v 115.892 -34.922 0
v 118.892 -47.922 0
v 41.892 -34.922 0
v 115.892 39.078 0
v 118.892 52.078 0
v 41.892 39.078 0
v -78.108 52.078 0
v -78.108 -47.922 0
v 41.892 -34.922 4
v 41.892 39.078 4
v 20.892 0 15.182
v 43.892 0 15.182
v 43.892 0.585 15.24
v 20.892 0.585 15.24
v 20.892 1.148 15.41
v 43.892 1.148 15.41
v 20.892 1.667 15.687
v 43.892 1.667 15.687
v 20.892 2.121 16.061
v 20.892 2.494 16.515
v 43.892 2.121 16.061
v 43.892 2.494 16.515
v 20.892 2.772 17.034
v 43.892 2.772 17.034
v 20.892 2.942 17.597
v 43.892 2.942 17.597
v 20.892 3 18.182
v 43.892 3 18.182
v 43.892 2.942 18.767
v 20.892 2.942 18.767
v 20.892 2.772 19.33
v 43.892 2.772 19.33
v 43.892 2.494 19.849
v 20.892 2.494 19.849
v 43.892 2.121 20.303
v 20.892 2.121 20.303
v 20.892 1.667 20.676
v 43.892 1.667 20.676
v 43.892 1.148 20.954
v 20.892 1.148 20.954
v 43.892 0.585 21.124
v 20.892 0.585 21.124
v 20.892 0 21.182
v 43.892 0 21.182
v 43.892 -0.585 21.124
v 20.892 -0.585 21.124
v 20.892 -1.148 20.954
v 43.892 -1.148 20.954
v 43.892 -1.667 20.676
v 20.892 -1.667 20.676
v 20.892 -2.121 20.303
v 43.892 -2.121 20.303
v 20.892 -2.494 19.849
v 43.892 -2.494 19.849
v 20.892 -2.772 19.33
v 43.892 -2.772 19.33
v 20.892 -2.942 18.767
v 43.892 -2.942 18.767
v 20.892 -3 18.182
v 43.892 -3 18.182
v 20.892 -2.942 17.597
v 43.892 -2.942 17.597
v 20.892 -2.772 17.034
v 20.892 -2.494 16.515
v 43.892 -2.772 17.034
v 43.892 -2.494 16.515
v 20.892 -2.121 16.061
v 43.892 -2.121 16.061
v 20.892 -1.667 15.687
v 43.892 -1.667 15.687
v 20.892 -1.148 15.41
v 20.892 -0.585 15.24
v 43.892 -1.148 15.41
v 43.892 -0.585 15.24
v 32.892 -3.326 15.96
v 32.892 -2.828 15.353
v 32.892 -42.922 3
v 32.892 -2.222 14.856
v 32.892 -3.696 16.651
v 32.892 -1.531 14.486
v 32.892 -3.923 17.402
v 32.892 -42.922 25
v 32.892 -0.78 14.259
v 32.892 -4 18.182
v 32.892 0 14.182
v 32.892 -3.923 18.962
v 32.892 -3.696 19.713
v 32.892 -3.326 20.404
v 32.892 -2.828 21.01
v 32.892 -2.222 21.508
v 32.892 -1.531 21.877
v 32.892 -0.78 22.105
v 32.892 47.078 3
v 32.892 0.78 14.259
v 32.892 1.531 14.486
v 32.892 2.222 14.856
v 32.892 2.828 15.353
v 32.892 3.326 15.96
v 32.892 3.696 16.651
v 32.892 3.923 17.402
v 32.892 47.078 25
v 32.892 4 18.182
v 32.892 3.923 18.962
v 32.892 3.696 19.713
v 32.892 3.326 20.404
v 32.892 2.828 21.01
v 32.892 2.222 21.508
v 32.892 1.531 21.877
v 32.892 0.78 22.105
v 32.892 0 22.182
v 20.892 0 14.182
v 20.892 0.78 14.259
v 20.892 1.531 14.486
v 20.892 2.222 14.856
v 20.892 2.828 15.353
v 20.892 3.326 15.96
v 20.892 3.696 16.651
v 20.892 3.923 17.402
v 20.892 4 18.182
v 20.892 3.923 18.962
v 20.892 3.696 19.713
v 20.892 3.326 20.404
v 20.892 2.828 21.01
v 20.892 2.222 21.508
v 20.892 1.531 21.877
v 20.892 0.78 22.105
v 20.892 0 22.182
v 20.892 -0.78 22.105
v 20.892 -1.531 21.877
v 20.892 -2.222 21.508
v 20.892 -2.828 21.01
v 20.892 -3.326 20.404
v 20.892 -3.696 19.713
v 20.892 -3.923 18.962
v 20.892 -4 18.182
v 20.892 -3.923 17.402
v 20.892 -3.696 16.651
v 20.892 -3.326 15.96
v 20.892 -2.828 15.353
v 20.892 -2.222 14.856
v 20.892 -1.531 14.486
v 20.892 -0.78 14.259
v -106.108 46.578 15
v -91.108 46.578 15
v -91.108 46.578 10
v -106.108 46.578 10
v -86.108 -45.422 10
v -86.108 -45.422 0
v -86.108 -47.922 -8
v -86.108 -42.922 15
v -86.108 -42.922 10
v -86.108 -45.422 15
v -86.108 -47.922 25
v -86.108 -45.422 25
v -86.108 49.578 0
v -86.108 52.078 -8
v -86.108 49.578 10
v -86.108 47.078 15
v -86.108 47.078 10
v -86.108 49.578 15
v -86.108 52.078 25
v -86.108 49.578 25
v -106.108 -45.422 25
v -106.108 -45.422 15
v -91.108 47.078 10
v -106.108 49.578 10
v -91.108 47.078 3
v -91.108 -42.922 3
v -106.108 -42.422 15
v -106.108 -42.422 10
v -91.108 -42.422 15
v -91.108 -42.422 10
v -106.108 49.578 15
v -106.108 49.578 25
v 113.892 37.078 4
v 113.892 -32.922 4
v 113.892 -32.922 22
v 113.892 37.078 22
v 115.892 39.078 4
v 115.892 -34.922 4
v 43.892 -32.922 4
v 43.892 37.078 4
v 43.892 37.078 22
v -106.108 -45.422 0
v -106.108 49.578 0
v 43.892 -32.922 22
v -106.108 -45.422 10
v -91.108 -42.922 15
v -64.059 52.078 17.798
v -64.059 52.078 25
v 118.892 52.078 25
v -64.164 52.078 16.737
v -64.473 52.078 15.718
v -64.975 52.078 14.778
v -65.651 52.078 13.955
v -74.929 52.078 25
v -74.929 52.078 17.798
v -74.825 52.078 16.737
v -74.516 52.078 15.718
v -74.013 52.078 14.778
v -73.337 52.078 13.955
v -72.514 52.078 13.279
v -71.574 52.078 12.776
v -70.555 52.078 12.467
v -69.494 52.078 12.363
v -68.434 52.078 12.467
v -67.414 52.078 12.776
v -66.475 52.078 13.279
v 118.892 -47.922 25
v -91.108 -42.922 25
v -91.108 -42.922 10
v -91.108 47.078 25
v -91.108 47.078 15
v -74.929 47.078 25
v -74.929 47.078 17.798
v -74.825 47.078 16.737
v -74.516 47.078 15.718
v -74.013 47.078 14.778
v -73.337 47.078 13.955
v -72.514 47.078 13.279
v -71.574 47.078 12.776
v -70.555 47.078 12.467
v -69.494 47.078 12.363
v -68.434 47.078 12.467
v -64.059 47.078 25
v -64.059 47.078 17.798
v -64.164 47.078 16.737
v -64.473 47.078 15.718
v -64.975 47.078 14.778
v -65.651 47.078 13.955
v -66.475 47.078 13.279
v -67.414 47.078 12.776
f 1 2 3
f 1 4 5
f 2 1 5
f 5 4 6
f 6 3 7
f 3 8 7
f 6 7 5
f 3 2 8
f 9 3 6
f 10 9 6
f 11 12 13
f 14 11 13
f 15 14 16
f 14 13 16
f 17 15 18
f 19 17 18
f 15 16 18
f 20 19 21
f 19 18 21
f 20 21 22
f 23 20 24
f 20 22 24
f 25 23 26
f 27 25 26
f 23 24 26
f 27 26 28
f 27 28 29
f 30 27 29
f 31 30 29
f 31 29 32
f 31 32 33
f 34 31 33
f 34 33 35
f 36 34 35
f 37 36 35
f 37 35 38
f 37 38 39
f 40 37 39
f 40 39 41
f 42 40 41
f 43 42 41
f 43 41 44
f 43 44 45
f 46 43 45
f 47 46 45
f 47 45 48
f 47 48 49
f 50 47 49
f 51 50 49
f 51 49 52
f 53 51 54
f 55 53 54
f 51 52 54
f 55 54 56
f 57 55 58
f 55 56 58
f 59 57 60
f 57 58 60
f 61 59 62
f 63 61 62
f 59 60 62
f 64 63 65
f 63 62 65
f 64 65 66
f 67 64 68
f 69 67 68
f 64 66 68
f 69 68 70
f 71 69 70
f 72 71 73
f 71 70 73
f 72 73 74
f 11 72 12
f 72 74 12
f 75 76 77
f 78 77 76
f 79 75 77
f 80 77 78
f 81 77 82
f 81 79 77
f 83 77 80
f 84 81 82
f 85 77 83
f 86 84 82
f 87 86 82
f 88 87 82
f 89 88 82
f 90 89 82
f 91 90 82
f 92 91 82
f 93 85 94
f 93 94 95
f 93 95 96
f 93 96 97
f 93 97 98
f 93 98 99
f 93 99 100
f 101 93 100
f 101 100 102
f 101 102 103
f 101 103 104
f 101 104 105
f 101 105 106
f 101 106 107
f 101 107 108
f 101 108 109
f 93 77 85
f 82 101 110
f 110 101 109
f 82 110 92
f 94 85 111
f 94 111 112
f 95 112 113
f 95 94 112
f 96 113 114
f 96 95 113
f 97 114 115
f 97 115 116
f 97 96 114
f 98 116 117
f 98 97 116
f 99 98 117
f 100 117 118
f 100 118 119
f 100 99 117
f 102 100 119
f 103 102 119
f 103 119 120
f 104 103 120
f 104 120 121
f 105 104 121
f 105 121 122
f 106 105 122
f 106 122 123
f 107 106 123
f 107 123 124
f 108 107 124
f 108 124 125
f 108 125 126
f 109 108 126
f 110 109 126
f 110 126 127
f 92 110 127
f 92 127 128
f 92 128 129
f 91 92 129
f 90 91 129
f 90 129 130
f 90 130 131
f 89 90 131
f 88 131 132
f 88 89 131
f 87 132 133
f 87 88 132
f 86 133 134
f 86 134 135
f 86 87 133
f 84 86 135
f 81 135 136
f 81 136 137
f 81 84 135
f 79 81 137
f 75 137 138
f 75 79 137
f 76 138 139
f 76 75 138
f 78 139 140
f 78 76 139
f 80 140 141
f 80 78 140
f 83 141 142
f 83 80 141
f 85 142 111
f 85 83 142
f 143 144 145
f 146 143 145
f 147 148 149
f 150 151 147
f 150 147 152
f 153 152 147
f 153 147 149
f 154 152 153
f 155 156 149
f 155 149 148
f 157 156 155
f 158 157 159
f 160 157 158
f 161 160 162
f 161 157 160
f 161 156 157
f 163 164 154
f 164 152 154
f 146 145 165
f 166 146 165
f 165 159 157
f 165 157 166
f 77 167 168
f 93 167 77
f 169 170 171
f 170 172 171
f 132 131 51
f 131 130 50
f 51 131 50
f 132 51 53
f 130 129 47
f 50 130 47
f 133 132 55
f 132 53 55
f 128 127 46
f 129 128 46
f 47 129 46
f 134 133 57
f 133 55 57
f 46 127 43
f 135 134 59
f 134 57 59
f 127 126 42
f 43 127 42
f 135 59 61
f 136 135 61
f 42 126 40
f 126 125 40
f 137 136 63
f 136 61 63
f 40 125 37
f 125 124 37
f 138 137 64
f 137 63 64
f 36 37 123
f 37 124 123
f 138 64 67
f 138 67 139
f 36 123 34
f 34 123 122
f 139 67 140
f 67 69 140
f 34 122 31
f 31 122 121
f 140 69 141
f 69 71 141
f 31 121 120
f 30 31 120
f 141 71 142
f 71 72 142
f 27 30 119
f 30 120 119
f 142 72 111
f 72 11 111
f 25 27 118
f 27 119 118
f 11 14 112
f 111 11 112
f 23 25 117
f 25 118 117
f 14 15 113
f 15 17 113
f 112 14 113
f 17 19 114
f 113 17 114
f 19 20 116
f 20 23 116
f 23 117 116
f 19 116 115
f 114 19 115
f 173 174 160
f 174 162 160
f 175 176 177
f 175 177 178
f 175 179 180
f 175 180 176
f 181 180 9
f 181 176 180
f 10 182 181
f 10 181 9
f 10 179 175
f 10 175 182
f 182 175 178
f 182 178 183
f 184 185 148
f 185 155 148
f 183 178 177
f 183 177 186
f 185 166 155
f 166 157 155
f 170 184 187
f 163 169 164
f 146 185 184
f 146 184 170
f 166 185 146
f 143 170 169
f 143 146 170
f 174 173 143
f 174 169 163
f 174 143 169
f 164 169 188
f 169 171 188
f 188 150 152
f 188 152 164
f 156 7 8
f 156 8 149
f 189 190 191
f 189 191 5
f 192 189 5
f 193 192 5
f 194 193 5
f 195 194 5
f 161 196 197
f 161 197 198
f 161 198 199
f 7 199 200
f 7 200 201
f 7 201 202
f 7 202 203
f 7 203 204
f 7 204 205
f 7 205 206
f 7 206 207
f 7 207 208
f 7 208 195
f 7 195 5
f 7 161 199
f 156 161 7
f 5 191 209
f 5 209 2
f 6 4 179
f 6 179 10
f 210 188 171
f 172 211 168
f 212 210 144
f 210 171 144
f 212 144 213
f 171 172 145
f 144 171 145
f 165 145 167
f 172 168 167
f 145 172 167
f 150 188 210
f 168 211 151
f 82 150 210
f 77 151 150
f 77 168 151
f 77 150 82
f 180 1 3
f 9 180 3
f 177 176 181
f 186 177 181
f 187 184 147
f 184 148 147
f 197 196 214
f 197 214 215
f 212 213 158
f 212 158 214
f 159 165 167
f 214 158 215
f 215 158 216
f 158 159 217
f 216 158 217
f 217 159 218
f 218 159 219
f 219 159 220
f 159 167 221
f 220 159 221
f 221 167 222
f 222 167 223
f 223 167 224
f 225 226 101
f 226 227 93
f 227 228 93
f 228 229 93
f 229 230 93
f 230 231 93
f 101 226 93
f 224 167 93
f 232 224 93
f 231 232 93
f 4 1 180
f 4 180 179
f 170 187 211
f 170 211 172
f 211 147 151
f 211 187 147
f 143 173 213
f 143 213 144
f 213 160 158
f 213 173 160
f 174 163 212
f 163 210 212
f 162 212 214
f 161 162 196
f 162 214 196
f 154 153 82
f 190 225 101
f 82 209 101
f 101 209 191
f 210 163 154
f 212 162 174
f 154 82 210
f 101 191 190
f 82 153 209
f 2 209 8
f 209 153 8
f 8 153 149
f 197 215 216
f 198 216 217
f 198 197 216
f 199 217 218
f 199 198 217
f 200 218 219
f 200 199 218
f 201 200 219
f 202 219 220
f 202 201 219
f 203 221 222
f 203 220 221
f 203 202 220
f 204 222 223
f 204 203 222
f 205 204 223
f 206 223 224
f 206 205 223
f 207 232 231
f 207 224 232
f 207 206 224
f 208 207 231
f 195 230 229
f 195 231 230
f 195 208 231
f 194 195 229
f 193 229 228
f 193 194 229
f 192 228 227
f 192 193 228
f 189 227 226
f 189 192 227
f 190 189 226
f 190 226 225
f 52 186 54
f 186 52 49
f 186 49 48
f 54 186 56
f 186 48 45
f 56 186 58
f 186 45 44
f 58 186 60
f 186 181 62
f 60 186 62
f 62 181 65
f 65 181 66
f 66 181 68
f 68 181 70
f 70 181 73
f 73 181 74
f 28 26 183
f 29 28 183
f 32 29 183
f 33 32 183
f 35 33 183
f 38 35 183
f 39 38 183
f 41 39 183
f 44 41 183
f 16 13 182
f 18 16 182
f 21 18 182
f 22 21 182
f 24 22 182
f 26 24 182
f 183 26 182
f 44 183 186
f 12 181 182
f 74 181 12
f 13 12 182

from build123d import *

# Parameters (mm, degrees)
SKETCH1_W           = 170
SKETCH1_H           = 100
BOSS_EXTRUDE1_DEPTH = 15
SKETCH3_W           = 70
SKETCH3_H           = 90
CUT_EXTRUDE2_DEPTH  = 12
SKETCH8_W           = 15
SKETCH8_H           = 15
CUT_EXTRUDE9_DEPTH  = 2.5
SKETCH9_W           = 15
SKETCH9_H           = 15
CUT_EXTRUDE10_DEPTH = 2.5
SKETCH10_W          = 12
SKETCH10_H          = 90
CUT_EXTRUDE11_DEPTH = 58
SKETCH11_W          = 128
SKETCH11_H          = 90
BOSS_EXTRUDE2_DEPTH = 10
SKETCH12_W          = 22
SKETCH12_H          = 90
BOSS_EXTRUDE4_DEPTH = 4
BOSS_EXTRUDE6_DEPTH = 100
SKETCH15_W          = 5
SKETCH15_H          = 3
CUT_EXTRUDE14_DEPTH = 15
SKETCH16_W          = 25
SKETCH16_H          = 100
BOSS_EXTRUDE7_DEPTH = 50
SKETCH17_W          = 70
SKETCH17_H          = 70
CUT_EXTRUDE15_DEPTH = 22
SKETCH18_W          = 74
SKETCH18_H          = 74
SKETCH18_W_2        = 70
SKETCH18_H_2        = 70
CUT_EXTRUDE16_DEPTH = 4
BOSS_EXTRUDE8_DEPTH = 5
SKETCH20_R          = 4
SKETCH20_R_2        = 3
BOSS_EXTRUDE9_DEPTH = 23
SKETCH20_2_R        = 3
CUT_EXTRUDE17_DEPTH = 23
CUT_EXTRUDE18_DEPTH = 23


with BuildPart() as part:
    # Sketch1 → Boss-Extrude1 (new body)
    with BuildSketch(Plane.XY):
        with Locations((-16.108033241, 2.077562327)):
            Rectangle(SKETCH1_W, SKETCH1_H)
    extrude(amount=BOSS_EXTRUDE1_DEPTH)

    # Sketch3 → Cut-Extrude2 (cut)
    with BuildSketch(Plane.XY.offset(15)):
        with Locations((-56.108033241, 2.077562327)):
            Rectangle(SKETCH3_W, SKETCH3_H)
    extrude(amount=-CUT_EXTRUDE2_DEPTH, mode=Mode.SUBTRACT)

    # Sketch8 → Cut-Extrude9 (cut)
    with BuildSketch(Plane(origin=(0, 52.077562327, 0), x_dir=(1, 0, 0), z_dir=(0, 1, 0))):
        with Locations((-93.608033241, -7.5)):
            Rectangle(SKETCH8_W, SKETCH8_H)
    extrude(amount=-CUT_EXTRUDE9_DEPTH, mode=Mode.SUBTRACT)

    # Sketch9 → Cut-Extrude10 (cut)
    with BuildSketch(Plane.XZ.offset(47.922437673)):
        with Locations((-93.608033241, 7.5)):
            Rectangle(SKETCH9_W, SKETCH9_H)
    extrude(amount=-CUT_EXTRUDE10_DEPTH, mode=Mode.SUBTRACT)

    # Sketch10 → Cut-Extrude11 (cut)
    with BuildSketch(Plane.ZY.offset(21.108033241)):
        with Locations((9, 2.077562327)):
            Rectangle(SKETCH10_W, SKETCH10_H)
    extrude(amount=-CUT_EXTRUDE11_DEPTH, mode=Mode.SUBTRACT)

    # Sketch11 → Boss-Extrude2 (add)
    with BuildSketch(Plane.XY.offset(15)):
        Polygon((-86.108033241, -45.422437673), (-86.108033241, -47.922437673), (68.891966759, -47.922437673), (68.891966759, 52.077562327), (-86.108033241, 52.077562327), (-86.108033241, 49.577562327), (-101.108033241, 49.577562327), (-101.108033241, -45.422437673), align=None)
        with Locations((-27.108033241, 2.077562327)):
            Rectangle(SKETCH11_W, SKETCH11_H, mode=Mode.SUBTRACT)
    extrude(amount=BOSS_EXTRUDE2_DEPTH)

    # Sketch12 → Boss-Extrude4 (add)
    with BuildSketch(Plane.ZY.offset(-36.891966759)):
        with Locations((14, 2.077562327)):
            Rectangle(SKETCH12_W, SKETCH12_H)
    extrude(amount=BOSS_EXTRUDE4_DEPTH)

    # Sketch14 → Boss-Extrude6 (add)
    with BuildSketch(Plane(origin=(0, 52.077562327, 0), x_dir=(1, 0, 0), z_dir=(0, 1, 0))):
        Polygon((-86.108033241, 0), (-78.108033241, 0), (-86.108033241, 8), align=None)
    extrude(amount=-BOSS_EXTRUDE6_DEPTH)

    # Sketch15 → Cut-Extrude14 (cut)
    with BuildSketch(Plane.ZY.offset(101.108033241)):
        with Locations((12.5, 48.077562327)):
            Rectangle(SKETCH15_W, SKETCH15_H)
        with Locations((12.5, -43.922437673)):
            Rectangle(SKETCH15_W, SKETCH15_H)
    extrude(amount=-CUT_EXTRUDE14_DEPTH, mode=Mode.SUBTRACT)

    # Sketch16 → Boss-Extrude7 (add)
    with BuildSketch(Plane(origin=(68.891966759, 0, 0), x_dir=(0, 0, -1), z_dir=(1, 0, 0))):
        with Locations((-12.5, 2.077562327)):
            Rectangle(SKETCH16_W, SKETCH16_H)
    extrude(amount=BOSS_EXTRUDE7_DEPTH)

    # Sketch17 → Cut-Extrude15 (cut)
    with BuildSketch(Plane(origin=(0, 0, 0), x_dir=(-1, 0, 0), z_dir=(0, 0, -1))):
        with Locations((-78.891966759, 2.077562327)):
            Rectangle(SKETCH17_W, SKETCH17_H)
    extrude(amount=-CUT_EXTRUDE15_DEPTH, mode=Mode.SUBTRACT)

    # Sketch18 → Cut-Extrude16 (cut)
    with BuildSketch(Plane(origin=(0, 0, 0), x_dir=(-1, 0, 0), z_dir=(0, 0, -1))):
        with Locations((-78.891966759, 2.077562327)):
            Rectangle(SKETCH18_W, SKETCH18_H)
        with Locations((-78.891966759, 2.077562327)):
            Rectangle(SKETCH18_W_2, SKETCH18_H_2, mode=Mode.SUBTRACT)
    extrude(amount=-CUT_EXTRUDE16_DEPTH, mode=Mode.SUBTRACT)

    # Sketch19 → Boss-Extrude8 (add)
    with BuildSketch(Plane.ZY.offset(101.108033241)):
        Polygon((10, 46.577562327), (10, 49.577562327), (0, 49.577562327), (0, -45.422437673), (10, -45.422437673), (10, -42.422437673), (15, -42.422437673), (15, -45.422437673), (25, -45.422437673), (25, 49.577562327), (15, 49.577562327), (15, 46.577562327), align=None)
    extrude(amount=BOSS_EXTRUDE8_DEPTH)

    # Sketch20 → Boss-Extrude9 (add)
    with BuildSketch(Plane(origin=(43.891966759, 0, 0), x_dir=(0, 0, -1), z_dir=(1, 0, 0))):
        with Locations((-18.181884359, 0)):
            Circle(SKETCH20_R)
        with Locations((-18.181884359, 0)):
            Circle(SKETCH20_R_2, mode=Mode.SUBTRACT)
    extrude(amount=-BOSS_EXTRUDE9_DEPTH)

    # Sketch20<2> → Cut-Extrude17 (cut)
    with BuildSketch(Plane(origin=(43.891966759, 0, 0), x_dir=(0, 0, -1), z_dir=(1, 0, 0))):
        with Locations((-18.181884359, 0)):
            Circle(SKETCH20_2_R)
    extrude(amount=-CUT_EXTRUDE17_DEPTH, mode=Mode.SUBTRACT)

    # Sketch21 → Cut-Extrude18 (cut)
    with BuildSketch(Plane(origin=(0, 52.077562327, 0), x_dir=(1, 0, 0), z_dir=(0, 1, 0))):
        with BuildLine():
            Line((-74.929235075, -25), (-74.929235075, -17.797726587))
            ThreePointArc((-74.929235075, -17.797726587), (-69.494183986, -12.362675498), (-64.059132898, -17.797726587))
            Line((-64.059132898, -17.797726587), (-64.059132898, -25))
            ThreePointArc((-64.059132898, -25), (-69.494183986, -30.435051089), (-74.929235075, -25))
        make_face()
    extrude(amount=-CUT_EXTRUDE18_DEPTH, mode=Mode.SUBTRACT)


solid = part.part
